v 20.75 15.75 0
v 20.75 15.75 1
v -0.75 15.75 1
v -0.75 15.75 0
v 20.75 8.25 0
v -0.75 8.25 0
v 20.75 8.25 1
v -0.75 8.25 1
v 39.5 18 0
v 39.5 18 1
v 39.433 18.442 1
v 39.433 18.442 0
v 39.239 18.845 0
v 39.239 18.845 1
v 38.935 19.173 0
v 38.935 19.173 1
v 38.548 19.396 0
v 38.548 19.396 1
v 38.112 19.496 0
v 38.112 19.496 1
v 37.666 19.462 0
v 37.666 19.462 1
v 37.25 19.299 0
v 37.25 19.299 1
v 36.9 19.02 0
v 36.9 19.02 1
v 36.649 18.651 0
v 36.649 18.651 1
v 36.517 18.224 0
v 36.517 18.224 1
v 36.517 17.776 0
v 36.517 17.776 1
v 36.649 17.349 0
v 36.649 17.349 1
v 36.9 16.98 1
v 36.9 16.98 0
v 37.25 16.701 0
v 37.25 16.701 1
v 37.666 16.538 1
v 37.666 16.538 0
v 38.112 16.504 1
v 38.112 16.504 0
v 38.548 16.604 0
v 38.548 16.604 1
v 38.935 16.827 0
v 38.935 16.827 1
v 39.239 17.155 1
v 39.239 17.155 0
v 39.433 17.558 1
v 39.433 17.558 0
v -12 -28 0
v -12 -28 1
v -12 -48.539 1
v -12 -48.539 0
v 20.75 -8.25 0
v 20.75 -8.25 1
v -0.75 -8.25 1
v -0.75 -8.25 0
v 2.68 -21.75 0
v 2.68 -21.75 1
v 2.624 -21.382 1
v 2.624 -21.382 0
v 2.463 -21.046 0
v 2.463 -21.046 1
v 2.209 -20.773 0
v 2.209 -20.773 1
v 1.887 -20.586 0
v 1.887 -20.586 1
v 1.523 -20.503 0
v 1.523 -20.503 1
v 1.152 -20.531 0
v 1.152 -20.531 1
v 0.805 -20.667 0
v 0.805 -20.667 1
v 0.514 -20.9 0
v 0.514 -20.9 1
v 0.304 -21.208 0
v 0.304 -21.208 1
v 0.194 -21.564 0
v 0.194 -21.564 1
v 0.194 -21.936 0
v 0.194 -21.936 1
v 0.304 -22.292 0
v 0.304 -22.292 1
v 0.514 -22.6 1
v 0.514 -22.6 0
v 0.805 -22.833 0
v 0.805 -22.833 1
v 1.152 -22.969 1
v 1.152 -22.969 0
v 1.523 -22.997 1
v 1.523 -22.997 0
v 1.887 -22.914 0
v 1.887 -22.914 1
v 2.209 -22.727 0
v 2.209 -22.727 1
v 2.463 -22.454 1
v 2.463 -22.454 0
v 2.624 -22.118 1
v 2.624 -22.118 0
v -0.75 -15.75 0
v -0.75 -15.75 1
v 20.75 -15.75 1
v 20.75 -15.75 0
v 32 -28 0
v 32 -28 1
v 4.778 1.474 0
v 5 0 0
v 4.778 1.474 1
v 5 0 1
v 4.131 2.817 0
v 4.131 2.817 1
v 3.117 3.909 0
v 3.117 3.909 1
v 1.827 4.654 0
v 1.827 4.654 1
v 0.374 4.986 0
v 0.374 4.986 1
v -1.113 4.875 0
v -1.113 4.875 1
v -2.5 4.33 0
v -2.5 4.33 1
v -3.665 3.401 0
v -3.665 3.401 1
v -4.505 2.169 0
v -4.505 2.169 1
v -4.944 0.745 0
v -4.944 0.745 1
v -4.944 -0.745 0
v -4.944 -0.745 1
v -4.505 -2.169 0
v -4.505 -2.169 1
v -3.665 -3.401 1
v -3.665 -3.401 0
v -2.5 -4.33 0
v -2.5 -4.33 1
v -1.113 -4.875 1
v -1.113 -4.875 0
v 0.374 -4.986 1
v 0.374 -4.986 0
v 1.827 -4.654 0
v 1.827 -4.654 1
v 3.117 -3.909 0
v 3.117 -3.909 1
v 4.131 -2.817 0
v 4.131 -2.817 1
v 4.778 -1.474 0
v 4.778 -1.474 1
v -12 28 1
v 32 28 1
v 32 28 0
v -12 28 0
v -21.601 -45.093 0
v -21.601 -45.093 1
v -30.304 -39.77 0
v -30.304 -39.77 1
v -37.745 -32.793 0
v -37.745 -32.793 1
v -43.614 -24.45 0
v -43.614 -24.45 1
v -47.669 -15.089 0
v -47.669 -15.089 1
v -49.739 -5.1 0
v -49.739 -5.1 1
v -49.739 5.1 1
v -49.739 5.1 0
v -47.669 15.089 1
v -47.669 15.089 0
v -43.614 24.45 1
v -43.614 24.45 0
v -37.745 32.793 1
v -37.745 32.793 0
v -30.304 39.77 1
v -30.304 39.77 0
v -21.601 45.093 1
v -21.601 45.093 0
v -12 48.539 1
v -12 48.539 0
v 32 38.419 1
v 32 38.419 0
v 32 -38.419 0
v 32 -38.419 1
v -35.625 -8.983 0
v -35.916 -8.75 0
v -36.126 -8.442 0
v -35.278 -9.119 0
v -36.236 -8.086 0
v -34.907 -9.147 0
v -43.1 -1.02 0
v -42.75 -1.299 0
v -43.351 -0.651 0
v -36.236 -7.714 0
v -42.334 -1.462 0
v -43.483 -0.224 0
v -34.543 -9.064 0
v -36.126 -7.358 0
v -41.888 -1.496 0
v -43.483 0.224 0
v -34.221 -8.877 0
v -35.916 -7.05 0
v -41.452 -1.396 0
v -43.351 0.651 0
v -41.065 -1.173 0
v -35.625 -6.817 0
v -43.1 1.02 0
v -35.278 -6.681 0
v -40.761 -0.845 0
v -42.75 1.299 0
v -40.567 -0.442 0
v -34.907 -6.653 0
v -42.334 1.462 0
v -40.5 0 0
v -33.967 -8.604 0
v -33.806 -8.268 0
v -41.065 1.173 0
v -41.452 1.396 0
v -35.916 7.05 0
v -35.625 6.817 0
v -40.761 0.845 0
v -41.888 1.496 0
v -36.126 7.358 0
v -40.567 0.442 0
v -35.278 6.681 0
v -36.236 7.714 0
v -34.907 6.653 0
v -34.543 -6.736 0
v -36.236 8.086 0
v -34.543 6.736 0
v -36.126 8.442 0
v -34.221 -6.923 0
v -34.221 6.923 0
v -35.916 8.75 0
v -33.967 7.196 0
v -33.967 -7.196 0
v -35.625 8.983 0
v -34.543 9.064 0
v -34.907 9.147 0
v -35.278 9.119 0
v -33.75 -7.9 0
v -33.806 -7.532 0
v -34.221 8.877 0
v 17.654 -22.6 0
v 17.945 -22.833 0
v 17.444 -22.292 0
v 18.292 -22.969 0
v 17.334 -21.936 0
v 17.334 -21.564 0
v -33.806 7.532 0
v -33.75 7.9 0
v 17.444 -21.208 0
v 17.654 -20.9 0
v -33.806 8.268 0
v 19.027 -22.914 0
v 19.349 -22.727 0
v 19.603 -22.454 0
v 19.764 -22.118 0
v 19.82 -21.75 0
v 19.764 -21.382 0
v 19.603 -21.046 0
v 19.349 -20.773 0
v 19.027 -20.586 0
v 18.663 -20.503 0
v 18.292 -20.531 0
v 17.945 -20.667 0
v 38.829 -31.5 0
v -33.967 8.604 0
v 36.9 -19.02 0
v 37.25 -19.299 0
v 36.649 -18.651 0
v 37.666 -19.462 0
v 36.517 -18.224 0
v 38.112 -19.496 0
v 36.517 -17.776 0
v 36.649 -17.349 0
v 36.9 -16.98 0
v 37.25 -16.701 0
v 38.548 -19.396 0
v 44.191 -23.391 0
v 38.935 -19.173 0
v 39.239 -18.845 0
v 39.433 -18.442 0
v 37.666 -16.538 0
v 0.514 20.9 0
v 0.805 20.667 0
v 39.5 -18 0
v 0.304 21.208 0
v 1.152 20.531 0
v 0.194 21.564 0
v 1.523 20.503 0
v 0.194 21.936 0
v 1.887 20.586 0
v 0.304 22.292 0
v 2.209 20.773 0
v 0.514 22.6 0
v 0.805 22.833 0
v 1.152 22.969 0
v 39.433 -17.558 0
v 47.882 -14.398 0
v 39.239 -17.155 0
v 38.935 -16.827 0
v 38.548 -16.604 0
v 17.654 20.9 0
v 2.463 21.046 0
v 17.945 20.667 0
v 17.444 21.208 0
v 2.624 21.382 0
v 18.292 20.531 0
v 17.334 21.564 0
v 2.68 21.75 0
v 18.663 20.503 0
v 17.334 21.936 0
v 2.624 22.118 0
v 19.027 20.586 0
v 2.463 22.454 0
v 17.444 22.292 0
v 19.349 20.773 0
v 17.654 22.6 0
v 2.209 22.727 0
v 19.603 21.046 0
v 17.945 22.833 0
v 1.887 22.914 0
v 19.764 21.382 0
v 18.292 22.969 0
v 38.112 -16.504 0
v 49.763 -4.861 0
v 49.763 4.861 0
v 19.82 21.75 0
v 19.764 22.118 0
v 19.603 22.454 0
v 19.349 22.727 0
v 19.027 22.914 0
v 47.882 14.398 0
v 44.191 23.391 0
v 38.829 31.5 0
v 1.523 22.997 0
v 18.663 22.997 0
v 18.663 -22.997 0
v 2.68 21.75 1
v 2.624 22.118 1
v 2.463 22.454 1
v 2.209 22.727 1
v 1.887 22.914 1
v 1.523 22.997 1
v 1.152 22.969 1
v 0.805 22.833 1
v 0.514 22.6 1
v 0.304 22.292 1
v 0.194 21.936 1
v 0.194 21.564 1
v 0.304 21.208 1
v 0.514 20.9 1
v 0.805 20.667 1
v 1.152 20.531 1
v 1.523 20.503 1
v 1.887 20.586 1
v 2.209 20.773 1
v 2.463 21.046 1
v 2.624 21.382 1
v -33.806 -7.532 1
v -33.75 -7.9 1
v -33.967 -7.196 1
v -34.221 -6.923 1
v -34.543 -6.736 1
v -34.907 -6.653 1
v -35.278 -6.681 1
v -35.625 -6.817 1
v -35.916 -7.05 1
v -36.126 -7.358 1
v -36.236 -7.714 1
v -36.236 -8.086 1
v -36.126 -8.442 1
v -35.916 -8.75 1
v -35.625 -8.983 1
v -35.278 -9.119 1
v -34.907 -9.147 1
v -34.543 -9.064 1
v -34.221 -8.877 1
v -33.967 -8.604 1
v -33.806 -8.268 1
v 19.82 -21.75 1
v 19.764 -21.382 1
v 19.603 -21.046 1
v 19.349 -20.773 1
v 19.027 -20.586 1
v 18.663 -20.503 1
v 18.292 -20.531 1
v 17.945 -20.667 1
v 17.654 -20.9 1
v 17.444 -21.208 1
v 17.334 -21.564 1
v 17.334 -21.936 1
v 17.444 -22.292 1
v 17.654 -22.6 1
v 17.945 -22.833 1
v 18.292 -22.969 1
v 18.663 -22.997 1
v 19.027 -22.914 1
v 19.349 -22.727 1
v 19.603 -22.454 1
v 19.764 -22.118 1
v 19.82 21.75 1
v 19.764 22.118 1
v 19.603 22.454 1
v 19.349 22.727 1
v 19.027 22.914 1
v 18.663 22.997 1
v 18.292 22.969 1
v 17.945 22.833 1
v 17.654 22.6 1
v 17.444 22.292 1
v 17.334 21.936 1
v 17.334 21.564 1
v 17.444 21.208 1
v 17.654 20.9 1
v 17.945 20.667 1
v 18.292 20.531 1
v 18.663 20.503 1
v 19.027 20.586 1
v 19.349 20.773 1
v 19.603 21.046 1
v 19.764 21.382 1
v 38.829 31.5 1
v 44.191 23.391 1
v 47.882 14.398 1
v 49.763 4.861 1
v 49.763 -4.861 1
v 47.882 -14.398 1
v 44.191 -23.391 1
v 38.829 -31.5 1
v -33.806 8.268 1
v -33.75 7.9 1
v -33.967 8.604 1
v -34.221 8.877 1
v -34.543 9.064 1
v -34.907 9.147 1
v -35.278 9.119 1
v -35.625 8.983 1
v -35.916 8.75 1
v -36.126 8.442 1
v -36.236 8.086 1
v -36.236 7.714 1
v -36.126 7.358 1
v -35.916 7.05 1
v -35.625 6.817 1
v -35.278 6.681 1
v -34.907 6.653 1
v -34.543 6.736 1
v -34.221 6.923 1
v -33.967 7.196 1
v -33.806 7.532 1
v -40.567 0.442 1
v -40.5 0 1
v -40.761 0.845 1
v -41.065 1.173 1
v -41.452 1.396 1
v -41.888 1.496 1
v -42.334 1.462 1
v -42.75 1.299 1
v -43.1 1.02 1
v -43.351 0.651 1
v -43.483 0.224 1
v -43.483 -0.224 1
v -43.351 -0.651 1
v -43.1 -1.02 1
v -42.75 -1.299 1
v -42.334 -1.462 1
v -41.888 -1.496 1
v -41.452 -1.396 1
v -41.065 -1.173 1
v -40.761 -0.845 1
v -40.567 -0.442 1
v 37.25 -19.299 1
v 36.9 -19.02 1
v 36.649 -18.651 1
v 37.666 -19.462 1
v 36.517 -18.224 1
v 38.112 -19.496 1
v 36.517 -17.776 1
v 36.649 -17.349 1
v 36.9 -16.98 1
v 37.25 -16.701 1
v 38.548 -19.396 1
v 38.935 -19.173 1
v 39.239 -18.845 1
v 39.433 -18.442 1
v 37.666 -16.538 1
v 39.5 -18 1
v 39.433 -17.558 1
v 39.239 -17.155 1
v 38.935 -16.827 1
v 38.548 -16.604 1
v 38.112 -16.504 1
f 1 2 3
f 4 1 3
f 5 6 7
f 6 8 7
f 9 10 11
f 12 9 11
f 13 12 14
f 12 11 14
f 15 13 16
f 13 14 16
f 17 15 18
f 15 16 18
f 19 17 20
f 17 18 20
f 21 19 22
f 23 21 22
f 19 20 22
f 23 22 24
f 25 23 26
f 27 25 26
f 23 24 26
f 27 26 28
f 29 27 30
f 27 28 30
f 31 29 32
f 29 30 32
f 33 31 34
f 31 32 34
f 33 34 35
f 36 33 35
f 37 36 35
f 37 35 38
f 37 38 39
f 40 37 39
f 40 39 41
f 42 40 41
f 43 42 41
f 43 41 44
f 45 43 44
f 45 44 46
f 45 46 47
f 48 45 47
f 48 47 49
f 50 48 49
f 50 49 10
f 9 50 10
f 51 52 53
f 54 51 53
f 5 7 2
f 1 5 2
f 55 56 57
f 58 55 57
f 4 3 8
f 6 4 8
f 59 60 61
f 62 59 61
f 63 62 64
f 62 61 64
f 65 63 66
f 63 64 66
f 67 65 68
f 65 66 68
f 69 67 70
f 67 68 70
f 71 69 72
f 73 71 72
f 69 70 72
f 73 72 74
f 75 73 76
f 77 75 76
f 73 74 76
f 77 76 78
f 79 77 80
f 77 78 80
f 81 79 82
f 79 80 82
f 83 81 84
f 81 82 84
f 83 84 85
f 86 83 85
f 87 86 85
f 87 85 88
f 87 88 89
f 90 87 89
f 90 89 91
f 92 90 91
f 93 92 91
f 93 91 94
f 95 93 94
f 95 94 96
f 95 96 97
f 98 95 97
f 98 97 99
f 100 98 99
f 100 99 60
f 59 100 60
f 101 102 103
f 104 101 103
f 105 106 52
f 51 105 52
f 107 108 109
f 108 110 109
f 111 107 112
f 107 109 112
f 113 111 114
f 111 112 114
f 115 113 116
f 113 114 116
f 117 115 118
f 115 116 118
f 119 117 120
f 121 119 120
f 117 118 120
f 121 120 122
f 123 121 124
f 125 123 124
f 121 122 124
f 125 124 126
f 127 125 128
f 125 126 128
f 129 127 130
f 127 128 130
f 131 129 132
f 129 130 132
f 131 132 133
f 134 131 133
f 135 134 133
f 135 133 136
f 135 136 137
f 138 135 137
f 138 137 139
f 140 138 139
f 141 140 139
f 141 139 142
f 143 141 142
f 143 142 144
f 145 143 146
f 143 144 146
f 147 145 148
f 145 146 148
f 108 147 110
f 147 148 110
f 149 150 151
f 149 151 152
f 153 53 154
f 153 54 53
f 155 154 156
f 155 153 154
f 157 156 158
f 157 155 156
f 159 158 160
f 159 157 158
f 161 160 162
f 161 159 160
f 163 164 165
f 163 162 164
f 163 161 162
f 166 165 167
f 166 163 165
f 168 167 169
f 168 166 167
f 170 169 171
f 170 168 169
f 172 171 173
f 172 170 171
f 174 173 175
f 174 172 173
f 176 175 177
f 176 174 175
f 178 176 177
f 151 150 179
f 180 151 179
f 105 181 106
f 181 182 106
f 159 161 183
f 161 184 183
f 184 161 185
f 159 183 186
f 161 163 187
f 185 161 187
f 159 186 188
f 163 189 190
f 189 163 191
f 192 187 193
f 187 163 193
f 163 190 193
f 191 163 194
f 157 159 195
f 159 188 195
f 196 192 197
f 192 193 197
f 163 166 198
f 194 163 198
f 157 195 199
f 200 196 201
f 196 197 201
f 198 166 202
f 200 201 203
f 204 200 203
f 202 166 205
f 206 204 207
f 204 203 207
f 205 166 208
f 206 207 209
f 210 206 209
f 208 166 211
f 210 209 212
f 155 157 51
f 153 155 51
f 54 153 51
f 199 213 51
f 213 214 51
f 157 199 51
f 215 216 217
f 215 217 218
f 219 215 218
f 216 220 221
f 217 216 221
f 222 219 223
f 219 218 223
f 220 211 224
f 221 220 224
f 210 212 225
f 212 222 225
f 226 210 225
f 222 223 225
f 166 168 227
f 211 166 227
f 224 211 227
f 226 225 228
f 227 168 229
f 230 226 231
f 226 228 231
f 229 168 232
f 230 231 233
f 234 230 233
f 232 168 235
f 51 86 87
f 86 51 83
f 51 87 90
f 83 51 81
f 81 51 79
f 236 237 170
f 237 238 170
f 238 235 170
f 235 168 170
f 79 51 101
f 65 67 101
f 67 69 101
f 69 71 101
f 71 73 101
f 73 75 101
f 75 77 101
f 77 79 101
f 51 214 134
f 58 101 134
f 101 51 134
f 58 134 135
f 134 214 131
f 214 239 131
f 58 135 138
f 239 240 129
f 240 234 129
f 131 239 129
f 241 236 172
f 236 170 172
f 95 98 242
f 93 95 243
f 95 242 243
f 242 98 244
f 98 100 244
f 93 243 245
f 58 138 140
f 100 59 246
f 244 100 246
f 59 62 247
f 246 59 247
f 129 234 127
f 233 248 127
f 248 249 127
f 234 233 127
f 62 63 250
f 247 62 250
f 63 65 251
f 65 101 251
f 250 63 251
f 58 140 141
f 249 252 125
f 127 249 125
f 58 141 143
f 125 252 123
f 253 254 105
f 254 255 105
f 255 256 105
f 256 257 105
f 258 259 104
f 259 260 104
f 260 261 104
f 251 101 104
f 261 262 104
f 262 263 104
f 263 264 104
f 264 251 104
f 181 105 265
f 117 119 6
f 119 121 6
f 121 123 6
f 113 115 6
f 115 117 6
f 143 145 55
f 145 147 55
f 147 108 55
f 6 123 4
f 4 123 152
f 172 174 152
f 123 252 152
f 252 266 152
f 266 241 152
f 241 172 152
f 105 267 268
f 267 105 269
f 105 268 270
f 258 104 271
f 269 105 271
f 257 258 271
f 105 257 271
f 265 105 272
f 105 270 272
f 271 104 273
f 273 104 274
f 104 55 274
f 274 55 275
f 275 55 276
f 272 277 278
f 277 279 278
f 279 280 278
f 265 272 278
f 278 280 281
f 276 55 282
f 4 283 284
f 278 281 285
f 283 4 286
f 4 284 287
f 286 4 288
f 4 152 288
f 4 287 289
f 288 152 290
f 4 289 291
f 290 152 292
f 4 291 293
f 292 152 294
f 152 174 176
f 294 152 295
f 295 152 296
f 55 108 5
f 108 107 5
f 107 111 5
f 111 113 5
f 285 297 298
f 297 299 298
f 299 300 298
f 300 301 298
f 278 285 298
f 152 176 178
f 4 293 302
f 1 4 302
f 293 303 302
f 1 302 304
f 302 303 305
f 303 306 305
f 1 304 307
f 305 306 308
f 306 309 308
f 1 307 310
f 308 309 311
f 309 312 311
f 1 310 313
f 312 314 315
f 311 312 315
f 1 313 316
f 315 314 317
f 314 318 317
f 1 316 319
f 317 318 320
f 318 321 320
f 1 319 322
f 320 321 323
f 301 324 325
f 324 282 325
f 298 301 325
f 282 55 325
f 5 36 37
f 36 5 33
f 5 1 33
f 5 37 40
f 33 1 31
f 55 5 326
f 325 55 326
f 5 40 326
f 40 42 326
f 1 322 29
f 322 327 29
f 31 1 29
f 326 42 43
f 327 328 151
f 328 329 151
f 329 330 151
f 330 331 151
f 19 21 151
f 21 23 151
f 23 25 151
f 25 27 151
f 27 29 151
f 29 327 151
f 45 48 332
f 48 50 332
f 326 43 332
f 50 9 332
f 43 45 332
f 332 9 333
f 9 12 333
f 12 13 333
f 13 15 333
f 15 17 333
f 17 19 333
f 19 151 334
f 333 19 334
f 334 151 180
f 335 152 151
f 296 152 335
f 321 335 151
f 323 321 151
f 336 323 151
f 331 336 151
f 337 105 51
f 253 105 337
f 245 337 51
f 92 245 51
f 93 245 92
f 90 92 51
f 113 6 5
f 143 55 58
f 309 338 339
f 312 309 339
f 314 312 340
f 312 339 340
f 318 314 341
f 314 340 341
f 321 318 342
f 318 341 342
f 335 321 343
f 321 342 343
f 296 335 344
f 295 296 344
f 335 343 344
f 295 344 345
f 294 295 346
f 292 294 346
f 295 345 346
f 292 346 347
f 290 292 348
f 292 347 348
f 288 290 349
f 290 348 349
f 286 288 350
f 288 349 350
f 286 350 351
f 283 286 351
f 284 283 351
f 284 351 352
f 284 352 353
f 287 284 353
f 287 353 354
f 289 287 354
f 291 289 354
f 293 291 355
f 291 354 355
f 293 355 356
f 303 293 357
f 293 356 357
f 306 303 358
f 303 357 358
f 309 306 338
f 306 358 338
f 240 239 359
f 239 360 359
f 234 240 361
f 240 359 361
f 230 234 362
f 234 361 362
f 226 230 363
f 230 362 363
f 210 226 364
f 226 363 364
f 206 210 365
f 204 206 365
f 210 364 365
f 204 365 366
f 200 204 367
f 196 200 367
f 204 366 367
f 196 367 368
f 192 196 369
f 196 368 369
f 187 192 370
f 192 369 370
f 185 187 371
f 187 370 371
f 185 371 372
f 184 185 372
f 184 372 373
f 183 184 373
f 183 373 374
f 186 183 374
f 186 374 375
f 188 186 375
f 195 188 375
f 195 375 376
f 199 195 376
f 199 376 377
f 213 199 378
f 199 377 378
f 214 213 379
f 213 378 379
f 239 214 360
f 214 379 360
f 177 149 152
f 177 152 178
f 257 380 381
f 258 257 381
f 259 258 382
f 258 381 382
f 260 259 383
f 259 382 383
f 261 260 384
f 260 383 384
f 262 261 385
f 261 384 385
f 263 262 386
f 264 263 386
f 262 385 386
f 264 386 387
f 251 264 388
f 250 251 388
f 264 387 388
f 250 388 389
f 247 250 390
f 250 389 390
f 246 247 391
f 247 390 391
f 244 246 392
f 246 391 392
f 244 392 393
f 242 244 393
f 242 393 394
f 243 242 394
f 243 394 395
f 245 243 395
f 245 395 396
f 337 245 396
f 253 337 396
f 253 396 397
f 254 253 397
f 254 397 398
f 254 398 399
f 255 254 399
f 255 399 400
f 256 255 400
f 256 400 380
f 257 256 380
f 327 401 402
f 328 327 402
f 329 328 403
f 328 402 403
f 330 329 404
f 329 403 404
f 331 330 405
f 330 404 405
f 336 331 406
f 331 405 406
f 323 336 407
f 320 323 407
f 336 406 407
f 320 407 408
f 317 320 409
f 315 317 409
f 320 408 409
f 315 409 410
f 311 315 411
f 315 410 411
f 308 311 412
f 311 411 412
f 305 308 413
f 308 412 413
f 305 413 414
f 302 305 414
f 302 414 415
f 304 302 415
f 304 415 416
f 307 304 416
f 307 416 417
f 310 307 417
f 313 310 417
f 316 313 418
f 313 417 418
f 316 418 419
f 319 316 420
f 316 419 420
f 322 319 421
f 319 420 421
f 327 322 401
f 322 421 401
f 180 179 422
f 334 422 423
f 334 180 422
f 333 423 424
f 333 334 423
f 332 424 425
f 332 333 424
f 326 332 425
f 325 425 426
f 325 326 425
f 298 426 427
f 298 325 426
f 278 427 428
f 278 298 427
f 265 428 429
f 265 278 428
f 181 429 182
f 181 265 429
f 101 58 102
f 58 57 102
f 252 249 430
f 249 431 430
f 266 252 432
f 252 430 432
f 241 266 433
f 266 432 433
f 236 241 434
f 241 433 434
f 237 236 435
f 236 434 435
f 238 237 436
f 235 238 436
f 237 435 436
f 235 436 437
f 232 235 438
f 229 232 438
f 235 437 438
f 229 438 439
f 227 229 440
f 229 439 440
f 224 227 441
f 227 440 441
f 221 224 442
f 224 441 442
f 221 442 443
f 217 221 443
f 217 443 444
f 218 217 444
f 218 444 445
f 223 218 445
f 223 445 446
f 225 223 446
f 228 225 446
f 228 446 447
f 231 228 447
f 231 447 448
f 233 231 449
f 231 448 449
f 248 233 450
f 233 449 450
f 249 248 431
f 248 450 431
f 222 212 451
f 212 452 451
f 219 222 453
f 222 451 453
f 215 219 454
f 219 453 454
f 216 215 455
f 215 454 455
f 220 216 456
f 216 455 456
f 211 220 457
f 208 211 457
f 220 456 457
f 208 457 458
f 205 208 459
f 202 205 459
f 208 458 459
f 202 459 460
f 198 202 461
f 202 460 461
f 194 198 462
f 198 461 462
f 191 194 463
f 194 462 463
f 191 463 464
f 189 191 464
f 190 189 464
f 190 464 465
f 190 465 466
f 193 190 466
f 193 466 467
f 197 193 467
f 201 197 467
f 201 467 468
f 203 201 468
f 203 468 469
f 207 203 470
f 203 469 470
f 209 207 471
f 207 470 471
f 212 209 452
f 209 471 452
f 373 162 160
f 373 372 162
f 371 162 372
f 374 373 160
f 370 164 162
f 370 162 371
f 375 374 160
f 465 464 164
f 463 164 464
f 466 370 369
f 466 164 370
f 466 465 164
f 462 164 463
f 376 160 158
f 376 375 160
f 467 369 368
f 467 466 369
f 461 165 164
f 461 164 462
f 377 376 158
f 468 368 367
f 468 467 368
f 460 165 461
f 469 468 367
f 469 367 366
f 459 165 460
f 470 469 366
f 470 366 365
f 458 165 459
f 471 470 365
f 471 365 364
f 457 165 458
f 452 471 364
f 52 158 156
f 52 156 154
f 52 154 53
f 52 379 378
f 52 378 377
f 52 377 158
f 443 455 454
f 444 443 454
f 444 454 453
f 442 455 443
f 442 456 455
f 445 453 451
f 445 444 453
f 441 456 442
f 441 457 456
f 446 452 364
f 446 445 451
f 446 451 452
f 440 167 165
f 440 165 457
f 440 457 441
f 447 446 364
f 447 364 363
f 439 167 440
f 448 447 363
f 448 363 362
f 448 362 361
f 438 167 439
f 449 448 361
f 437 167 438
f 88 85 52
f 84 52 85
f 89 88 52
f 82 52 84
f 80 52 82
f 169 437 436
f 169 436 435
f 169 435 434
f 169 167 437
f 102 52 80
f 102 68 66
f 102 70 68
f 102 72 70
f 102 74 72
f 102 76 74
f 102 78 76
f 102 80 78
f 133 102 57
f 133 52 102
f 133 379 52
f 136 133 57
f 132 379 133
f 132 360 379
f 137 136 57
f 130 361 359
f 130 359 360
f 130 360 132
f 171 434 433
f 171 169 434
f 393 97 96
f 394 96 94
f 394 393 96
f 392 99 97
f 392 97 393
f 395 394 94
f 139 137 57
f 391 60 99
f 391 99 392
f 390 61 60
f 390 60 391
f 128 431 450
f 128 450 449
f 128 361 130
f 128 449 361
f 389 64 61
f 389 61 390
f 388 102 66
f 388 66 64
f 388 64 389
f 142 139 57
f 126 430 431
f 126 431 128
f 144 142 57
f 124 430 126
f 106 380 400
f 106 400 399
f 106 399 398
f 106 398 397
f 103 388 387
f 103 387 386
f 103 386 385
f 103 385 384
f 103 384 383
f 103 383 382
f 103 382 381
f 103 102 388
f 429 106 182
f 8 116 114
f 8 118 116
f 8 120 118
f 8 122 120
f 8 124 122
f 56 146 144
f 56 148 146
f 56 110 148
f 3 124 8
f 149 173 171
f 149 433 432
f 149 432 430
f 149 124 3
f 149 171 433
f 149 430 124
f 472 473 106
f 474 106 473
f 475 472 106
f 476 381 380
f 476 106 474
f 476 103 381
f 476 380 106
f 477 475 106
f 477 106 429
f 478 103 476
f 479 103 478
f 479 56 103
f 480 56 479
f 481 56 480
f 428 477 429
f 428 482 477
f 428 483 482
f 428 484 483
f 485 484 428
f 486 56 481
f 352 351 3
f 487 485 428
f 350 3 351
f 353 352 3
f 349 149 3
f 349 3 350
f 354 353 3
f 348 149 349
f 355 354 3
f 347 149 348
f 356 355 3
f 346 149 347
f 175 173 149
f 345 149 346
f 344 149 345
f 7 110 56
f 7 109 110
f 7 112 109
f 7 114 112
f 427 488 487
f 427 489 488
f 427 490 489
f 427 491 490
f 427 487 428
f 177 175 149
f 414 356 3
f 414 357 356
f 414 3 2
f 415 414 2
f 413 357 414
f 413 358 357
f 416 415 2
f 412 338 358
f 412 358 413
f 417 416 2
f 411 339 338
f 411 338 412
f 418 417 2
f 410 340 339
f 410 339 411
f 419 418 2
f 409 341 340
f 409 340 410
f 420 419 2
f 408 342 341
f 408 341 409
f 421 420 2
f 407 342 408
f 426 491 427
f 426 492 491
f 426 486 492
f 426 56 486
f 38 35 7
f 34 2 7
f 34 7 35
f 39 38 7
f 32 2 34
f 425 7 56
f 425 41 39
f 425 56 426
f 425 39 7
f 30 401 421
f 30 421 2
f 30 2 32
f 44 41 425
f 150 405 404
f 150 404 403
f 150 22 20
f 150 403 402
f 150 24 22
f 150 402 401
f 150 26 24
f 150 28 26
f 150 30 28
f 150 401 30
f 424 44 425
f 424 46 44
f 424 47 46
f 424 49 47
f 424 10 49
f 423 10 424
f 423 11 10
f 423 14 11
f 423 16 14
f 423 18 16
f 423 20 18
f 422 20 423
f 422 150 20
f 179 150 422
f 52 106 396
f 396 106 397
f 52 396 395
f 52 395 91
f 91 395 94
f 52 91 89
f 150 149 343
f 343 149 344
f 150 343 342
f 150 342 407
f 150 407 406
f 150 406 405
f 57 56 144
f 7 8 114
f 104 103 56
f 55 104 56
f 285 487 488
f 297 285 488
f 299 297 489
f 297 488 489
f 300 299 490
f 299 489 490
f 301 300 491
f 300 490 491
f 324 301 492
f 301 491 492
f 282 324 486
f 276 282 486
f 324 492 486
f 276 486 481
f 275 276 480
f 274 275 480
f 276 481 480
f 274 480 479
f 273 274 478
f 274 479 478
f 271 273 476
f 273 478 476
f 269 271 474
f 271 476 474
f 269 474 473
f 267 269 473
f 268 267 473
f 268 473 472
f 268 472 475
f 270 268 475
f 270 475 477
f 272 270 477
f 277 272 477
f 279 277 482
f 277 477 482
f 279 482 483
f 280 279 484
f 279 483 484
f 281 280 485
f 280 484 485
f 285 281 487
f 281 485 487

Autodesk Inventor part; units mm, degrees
ref_plane "YZ Plane" through (0, 0, 0) normal (1, 0, 0) x (0, 1, 0)
ref_plane "XZ Plane" through (0, 0, 0) normal (0, 1, 0) x (-1, 0, 0)
ref_plane "XY Plane" through (0, 0, 0) normal (0, 0, 1) x (1, 0, 0)
sketch "Sketch1" plane through (0, 0, 0) normal (0, 0, 1) x (1, 0, 0)
  circle A0 centre (0, 0) radius 50
  dimension "d0" = 100
extrude "Extrusion1" add sketch "Sketch1" along normal blind 1
sketch "Sketch3" plane through (0, 0, 1) normal (0, 0, 1) x (1, 0, 0)
  circle A0 centre (0, 0) radius 50 construction
  line L0 (50, 0) -> (-50, 0)
  line L1 (10, 28) -> (-12, 28)
  line L2 (10, 28) -> (32, 28)
  line L3 (32, 28) -> (32, 38.4187)
  line L4 (-12, 28) -> (-12, 48.5386)
  line L5 (0, 0) -> (0, 50) construction
  arc A1 (32, 38.4187) -> (-12, 48.5386) centre (0, 0) ccw
  line L6 (32, -38.4187) -> (32, -28)
  line L7 (32, -28) -> (10, -28)
  line L8 (10, -28) -> (-12, -28)
  line L9 (-12, -28) -> (-12, -48.5386)
  line L10 (0, 0) -> (0, -50) construction
  arc A2 (-12, -48.5386) -> (32, -38.4187) centre (0, 0) ccw
  arc A3 (32, 38.4187) -> (-12, 48.5386) centre (0, 0) ccw
  dimension "d18" = 100
  dimension "d19" = 44
  dimension "d21" = 22
  dimension "d22" = 10
  dimension "d23" = 44
  dimension "d24" = 22
  dimension "d25" = 10
extrude "Extrusion4" cut sketch "Sketch3" against normal through all
sketch "Sketch4" plane through (0, 0, 1) normal (0, 0, 1) x (1, 0, 0)
  line L0 (0, 0) -> (10, 0)
  line L1 (10, 0) -> (10, 12)
  line L2 (10, 0) -> (10, -12)
  line L3 (-0.75, -15.75) -> (20.75, -15.75)
  line L4 (20.75, -15.75) -> (20.75, -8.25)
  line L5 (20.75, -8.25) -> (-0.75, -8.25)
  line L6 (-0.75, -8.25) -> (-0.75, -15.75)
  line L7 (-0.75, -15.75) -> (20.75, -8.25) construction
  line L8 (20.75, -15.75) -> (-0.75, -8.25) construction
  line L9 (-0.75, 8.25) -> (20.75, 8.25)
  line L10 (20.75, 8.25) -> (20.75, 15.75)
  line L11 (20.75, 15.75) -> (-0.75, 15.75)
  line L12 (-0.75, 15.75) -> (-0.75, 8.25)
  line L13 (-0.75, 8.25) -> (20.75, 15.75) construction
  line L14 (20.75, 8.25) -> (-0.75, 15.75) construction
  dimension "d28" = 10
  dimension "d29" = 12
  dimension "d30" = 12
  dimension "d31" = 21.5
  dimension "d32" = 7.5
  dimension "d33" = 21.5
  dimension "d34" = 7.5
extrude "Extrusion5" cut sketch "Sketch4" against normal through all
sketch "Sketch5" plane through (0, 0, 1) normal (0, 0, 1) x (1, 0, 0)
  circle A0 centre (0, 0) radius 5
  dimension "d37" = 10
extrude "Extrusion6" cut sketch "Sketch5" against normal through all
sketch "Sketch6" plane through (0, 0, 1) normal (0, 0, 1) x (1, 0, 0)
  line L0 (20.75, -15.75) -> (-0.75, -15.75) projected
  line L1 (-0.75, 15.75) -> (20.75, 15.75) projected
  line L2 (20.75, 15.75) -> (-0.75, 15.75) projected
  line L3 (10, 15.75) -> (10, 21.75)
  line L4 (10, -15.75) -> (10, -21.75)
  line L5 (1.43, 21.75) -> (18.57, 21.75)
  line L6 (1.43, -21.75) -> (18.57, -21.75)
  circle A0 centre (1.43, 21.75) radius 1.25
  circle A1 centre (18.57, 21.75) radius 1.25
  circle A2 centre (1.43, -21.75) radius 1.25
  circle A3 centre (18.57, -21.75) radius 1.25
  point P0 (0, 0)
  dimension "d40" = 6
  dimension "d41" = 6
  dimension "d42" = 17.14
  dimension "d43" = 17.14
  dimension "d44" = 2.5
  dimension "d45" = 2.5
  dimension "d46" = 2.5
  dimension "d47" = 2.5
extrude "Extrusion7" cut sketch "Sketch6" against normal through all
sketch "Sketch7" plane through (0, 0, 1) normal (0, 0, 1) x (1, 0, 0)
  line L0 (0, 0) -> (-35, 0)
  line L1 (-35, -7.9) -> (-35, 7.9)
  circle A0 centre (-35, -7.9) radius 1.25
  circle A1 centre (-35, 7.9) radius 1.25
  dimension "d50" = 35
  dimension "d51" = 15.8
  dimension "d52" = 2.5
  dimension "d53" = 2.5
extrude "Extrusion8" cut sketch "Sketch7" against normal through all
sketch "Sketch8" plane through (0, 0, 1) normal (0, 0, 1) x (1, 0, 0)
  line L0 (0, 0) -> (-42, 0) construction
  line L1 (0, 0) -> (38, 0) construction
  line L2 (38, 0) -> (38, 18) construction
  line L3 (38, 0) -> (38, -18) construction
  circle A0 centre (-42, 0) radius 1.5
  circle A1 centre (38, 18) radius 1.5
  circle A2 centre (38, -18) radius 1.5
  dimension "d56" = 42
  dimension "d57" = 38
  dimension "d58" = 18
  dimension "d59" = 3
extrude "Extrusion9" cut sketch "Sketch8" against normal through all
equation "\"d23\" = d19"
equation "\"d24\" = d21"
equation "\"d25\" = d22"
equation "\"d28\" = d22"
equation "\"d29\" = d30"
equation "\"d33\" = d31"
equation "\"d34\" = d32"
equation "\"d38\" = d37"
equation "\"d43\" = d42"
properties part number "Base Inferior" material "Glass"
